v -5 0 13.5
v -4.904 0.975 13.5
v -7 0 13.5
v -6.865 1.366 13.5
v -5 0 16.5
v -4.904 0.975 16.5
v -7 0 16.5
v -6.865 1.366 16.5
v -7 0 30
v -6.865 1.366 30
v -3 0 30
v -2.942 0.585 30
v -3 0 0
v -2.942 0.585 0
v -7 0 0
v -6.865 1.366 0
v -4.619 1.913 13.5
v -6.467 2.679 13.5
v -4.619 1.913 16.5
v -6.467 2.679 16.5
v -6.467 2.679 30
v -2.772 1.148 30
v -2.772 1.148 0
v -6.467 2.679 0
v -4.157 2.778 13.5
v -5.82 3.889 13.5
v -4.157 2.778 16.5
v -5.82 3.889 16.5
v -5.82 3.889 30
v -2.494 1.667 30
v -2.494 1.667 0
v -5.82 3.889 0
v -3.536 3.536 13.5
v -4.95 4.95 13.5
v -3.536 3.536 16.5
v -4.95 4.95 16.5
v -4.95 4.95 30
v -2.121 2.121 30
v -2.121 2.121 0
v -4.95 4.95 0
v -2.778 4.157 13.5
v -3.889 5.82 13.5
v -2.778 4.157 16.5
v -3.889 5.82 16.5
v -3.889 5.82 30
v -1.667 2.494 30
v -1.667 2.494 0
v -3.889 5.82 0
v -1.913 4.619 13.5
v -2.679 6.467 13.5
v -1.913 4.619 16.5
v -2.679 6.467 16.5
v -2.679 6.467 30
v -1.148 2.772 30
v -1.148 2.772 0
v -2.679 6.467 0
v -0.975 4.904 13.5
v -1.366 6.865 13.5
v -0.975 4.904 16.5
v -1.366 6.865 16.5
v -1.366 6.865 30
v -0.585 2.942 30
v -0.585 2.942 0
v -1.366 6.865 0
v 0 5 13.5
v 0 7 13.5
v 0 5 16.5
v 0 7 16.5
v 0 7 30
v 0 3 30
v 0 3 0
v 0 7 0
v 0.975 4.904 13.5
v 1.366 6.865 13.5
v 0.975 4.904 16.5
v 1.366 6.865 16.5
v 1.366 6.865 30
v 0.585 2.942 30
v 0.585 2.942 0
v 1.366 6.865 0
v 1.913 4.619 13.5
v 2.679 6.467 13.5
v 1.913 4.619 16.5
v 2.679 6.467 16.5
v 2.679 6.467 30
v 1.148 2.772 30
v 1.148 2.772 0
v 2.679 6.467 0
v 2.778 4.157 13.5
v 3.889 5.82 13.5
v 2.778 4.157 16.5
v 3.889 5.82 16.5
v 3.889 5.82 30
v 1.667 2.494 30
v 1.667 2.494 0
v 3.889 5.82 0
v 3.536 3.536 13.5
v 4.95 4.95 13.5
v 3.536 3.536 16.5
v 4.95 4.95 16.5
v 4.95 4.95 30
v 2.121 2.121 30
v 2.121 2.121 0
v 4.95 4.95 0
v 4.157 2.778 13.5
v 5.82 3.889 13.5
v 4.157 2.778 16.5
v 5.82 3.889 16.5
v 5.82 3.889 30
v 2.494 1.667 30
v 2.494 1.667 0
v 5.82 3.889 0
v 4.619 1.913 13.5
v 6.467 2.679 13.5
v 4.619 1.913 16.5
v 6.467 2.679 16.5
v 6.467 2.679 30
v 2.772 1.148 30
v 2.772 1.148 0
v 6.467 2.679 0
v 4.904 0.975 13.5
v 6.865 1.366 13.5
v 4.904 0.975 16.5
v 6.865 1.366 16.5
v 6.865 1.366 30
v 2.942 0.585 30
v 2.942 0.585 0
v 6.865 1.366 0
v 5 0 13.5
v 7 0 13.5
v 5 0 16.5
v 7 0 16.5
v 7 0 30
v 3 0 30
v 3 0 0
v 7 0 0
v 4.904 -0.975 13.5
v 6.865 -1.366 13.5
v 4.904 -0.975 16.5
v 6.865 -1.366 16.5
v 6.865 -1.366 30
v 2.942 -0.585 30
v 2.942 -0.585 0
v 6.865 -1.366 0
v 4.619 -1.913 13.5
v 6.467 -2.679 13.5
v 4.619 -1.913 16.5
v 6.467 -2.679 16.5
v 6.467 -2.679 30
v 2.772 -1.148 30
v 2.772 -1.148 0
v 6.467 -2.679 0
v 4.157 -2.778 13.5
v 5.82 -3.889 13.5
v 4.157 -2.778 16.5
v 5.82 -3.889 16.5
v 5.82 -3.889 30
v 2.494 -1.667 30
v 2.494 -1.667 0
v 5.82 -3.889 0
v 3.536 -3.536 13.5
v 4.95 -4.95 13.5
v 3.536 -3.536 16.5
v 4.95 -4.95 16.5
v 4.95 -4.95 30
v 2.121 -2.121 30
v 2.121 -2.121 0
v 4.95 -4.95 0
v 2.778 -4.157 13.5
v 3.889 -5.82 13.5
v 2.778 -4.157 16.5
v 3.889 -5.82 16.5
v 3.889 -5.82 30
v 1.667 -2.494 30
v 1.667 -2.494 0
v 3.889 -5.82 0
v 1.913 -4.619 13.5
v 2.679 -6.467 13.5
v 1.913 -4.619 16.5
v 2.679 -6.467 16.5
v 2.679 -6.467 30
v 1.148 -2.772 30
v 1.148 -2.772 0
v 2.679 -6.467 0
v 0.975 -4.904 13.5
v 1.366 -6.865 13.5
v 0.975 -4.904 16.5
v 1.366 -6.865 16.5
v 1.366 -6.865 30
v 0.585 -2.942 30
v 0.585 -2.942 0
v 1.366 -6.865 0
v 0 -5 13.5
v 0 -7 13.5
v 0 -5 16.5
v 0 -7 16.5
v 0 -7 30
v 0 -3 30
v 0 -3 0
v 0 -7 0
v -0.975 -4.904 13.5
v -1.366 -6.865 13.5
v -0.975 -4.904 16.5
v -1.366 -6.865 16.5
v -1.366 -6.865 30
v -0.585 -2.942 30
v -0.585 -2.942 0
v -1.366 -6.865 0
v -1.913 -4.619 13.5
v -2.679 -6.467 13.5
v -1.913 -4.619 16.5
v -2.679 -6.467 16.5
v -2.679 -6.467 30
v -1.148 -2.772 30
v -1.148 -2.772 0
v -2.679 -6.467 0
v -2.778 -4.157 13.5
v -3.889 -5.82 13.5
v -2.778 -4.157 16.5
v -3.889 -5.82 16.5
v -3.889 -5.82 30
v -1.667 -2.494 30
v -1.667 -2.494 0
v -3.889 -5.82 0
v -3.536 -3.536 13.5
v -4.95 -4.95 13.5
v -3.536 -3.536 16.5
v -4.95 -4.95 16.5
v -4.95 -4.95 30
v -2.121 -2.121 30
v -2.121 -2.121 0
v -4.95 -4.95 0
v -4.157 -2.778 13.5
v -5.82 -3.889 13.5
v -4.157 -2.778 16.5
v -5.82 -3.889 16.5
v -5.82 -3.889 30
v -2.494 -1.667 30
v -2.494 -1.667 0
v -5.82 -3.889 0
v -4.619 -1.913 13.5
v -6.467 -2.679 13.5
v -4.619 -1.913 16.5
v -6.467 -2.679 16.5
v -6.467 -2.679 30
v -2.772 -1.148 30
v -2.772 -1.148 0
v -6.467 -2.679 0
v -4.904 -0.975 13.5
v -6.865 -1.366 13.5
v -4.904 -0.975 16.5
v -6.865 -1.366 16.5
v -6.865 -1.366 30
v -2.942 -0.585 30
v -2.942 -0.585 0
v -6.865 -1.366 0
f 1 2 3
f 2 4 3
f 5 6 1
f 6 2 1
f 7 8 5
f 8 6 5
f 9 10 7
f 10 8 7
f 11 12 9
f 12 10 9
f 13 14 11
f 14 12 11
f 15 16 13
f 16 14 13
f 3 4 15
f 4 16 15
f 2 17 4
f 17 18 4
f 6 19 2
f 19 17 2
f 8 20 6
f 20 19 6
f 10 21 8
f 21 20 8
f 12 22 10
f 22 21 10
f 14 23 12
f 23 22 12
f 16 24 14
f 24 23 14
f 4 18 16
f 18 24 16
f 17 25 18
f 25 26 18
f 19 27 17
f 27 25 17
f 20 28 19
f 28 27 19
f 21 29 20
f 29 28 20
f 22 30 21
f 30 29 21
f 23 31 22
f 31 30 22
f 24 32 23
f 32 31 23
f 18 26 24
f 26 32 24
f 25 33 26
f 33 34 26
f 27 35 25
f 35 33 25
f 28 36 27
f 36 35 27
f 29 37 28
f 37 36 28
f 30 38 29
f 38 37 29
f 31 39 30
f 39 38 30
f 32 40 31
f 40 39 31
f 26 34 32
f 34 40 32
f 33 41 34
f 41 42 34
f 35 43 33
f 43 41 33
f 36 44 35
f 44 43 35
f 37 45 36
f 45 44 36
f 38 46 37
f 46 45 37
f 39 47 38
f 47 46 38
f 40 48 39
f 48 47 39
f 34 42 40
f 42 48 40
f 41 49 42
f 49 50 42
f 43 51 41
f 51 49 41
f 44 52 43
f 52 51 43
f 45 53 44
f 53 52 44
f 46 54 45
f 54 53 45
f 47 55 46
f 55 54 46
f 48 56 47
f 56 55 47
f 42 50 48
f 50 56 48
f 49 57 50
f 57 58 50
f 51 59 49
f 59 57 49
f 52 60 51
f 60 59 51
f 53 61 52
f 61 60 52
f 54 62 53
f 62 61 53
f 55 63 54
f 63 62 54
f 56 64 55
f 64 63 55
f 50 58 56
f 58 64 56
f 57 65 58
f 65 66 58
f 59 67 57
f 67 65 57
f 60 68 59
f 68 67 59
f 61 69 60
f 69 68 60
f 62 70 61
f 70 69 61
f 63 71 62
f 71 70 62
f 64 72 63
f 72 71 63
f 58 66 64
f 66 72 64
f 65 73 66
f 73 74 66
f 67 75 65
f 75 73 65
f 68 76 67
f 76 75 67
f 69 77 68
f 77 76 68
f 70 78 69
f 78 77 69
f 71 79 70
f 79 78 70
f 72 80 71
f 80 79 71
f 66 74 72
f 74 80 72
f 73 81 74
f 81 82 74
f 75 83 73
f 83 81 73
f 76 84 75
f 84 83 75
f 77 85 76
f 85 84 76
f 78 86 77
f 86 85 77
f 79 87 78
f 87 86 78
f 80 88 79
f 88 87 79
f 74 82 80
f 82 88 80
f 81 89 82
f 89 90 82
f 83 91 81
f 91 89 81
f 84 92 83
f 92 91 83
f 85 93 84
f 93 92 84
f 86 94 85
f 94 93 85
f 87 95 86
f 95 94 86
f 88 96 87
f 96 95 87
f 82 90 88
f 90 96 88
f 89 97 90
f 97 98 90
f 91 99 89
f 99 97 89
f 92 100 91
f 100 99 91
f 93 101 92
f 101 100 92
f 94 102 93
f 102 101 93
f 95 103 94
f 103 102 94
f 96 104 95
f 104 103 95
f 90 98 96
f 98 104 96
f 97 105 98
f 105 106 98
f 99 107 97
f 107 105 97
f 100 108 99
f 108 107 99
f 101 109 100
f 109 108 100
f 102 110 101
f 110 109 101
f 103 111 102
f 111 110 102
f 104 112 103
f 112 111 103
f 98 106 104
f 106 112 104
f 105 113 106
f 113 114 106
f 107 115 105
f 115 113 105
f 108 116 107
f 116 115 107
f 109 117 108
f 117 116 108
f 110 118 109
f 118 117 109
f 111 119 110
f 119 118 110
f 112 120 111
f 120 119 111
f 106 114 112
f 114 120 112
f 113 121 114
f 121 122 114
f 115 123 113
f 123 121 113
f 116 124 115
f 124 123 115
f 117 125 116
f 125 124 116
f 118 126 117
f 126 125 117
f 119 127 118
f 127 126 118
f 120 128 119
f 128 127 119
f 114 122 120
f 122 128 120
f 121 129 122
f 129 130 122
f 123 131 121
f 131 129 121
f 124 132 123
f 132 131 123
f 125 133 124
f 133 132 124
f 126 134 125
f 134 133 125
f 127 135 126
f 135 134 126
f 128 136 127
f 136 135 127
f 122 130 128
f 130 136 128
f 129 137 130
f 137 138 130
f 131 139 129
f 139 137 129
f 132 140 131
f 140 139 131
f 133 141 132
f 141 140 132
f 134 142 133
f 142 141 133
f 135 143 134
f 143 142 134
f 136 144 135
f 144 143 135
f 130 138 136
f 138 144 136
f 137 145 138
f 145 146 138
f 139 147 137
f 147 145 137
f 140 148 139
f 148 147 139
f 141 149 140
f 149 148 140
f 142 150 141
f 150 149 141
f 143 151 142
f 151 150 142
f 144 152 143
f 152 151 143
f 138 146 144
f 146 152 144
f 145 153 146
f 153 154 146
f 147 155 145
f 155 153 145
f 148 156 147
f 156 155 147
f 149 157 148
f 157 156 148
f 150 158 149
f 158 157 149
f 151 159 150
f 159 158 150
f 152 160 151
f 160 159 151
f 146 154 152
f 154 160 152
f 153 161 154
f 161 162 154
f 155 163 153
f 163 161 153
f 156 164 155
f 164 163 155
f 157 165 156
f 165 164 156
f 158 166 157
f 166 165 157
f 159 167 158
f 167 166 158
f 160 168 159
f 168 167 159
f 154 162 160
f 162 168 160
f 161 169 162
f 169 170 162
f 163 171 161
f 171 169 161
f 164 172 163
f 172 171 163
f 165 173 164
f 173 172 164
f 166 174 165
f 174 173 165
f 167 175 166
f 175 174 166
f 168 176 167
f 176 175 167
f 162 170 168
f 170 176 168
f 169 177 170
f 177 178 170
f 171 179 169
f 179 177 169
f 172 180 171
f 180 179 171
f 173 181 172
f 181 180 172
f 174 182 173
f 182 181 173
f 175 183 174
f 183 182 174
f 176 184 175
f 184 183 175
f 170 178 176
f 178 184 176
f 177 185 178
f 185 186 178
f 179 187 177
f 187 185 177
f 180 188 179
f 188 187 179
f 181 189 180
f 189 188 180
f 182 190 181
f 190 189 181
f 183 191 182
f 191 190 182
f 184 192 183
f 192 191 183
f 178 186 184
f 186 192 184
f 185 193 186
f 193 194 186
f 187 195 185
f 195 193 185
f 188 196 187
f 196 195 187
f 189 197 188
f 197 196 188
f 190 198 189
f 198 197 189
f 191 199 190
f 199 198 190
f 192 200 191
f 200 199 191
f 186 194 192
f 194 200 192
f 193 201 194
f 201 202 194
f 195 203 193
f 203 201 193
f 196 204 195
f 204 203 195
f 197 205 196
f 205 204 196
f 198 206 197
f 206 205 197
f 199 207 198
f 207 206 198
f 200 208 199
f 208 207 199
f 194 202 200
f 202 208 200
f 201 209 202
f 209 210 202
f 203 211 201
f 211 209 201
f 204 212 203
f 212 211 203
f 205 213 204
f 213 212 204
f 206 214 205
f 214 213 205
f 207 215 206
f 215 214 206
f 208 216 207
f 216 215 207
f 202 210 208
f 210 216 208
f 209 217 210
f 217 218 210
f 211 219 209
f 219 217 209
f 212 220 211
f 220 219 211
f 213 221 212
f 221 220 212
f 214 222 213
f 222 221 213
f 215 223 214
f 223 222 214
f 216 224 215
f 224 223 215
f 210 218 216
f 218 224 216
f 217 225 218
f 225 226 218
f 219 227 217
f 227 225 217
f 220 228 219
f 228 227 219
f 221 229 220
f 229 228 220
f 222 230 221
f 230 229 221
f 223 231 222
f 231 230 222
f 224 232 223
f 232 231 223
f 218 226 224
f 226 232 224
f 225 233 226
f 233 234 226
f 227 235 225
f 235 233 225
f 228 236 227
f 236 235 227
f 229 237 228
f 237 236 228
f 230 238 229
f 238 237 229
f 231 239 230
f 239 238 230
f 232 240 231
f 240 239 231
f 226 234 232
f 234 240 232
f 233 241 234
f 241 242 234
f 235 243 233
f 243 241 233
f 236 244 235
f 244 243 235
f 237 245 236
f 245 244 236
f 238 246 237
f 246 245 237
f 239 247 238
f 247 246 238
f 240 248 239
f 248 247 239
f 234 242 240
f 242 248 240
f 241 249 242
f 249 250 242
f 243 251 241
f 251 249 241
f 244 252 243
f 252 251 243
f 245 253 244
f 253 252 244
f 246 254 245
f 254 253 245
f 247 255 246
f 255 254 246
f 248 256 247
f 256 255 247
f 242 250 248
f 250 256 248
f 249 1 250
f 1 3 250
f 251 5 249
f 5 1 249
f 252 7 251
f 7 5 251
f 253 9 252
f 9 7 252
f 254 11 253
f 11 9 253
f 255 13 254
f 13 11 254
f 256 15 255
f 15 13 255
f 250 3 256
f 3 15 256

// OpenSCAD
$fn = 32;

// ----------------------------------------------------------------------
// Grooved revolve: plain_grooves, bore R3
// ----------------------------------------------------------------------

// --- parameters (mm) ---
bore_r = 3;               // bore radius
outer_r = 7;              // outer radius of the body
total_h = 30;             // overall height, Z
wall = 4;                 // radial wall thickness
groove_w = 3;             // groove width
groove_d = 2;             // groove depth
grooves = 1;              // number of outer grooves
fit_tol = 0.05;           // declared fit tolerance (prompt contract)
free_tol = 0.2;           // declared free tolerance (prompt contract)

bbox_x = 2 * outer_r;  // full diameter
bore_d = 2 * bore_r;  // bore diameter
body_d = 2 * outer_r;  // body diameter
revolve_angle = 360;  // full turn around the Z axis

profile = [[3, 0], [7, 0], [7, 13.5], [5, 13.5], [5, 16.5], [7, 16.5], [7, 30], [3, 30]];  // primary outline, 8 points, counter clockwise

// --- the one profile operation ---
rotate_extrude(angle = revolve_angle) polygon(points = profile);
